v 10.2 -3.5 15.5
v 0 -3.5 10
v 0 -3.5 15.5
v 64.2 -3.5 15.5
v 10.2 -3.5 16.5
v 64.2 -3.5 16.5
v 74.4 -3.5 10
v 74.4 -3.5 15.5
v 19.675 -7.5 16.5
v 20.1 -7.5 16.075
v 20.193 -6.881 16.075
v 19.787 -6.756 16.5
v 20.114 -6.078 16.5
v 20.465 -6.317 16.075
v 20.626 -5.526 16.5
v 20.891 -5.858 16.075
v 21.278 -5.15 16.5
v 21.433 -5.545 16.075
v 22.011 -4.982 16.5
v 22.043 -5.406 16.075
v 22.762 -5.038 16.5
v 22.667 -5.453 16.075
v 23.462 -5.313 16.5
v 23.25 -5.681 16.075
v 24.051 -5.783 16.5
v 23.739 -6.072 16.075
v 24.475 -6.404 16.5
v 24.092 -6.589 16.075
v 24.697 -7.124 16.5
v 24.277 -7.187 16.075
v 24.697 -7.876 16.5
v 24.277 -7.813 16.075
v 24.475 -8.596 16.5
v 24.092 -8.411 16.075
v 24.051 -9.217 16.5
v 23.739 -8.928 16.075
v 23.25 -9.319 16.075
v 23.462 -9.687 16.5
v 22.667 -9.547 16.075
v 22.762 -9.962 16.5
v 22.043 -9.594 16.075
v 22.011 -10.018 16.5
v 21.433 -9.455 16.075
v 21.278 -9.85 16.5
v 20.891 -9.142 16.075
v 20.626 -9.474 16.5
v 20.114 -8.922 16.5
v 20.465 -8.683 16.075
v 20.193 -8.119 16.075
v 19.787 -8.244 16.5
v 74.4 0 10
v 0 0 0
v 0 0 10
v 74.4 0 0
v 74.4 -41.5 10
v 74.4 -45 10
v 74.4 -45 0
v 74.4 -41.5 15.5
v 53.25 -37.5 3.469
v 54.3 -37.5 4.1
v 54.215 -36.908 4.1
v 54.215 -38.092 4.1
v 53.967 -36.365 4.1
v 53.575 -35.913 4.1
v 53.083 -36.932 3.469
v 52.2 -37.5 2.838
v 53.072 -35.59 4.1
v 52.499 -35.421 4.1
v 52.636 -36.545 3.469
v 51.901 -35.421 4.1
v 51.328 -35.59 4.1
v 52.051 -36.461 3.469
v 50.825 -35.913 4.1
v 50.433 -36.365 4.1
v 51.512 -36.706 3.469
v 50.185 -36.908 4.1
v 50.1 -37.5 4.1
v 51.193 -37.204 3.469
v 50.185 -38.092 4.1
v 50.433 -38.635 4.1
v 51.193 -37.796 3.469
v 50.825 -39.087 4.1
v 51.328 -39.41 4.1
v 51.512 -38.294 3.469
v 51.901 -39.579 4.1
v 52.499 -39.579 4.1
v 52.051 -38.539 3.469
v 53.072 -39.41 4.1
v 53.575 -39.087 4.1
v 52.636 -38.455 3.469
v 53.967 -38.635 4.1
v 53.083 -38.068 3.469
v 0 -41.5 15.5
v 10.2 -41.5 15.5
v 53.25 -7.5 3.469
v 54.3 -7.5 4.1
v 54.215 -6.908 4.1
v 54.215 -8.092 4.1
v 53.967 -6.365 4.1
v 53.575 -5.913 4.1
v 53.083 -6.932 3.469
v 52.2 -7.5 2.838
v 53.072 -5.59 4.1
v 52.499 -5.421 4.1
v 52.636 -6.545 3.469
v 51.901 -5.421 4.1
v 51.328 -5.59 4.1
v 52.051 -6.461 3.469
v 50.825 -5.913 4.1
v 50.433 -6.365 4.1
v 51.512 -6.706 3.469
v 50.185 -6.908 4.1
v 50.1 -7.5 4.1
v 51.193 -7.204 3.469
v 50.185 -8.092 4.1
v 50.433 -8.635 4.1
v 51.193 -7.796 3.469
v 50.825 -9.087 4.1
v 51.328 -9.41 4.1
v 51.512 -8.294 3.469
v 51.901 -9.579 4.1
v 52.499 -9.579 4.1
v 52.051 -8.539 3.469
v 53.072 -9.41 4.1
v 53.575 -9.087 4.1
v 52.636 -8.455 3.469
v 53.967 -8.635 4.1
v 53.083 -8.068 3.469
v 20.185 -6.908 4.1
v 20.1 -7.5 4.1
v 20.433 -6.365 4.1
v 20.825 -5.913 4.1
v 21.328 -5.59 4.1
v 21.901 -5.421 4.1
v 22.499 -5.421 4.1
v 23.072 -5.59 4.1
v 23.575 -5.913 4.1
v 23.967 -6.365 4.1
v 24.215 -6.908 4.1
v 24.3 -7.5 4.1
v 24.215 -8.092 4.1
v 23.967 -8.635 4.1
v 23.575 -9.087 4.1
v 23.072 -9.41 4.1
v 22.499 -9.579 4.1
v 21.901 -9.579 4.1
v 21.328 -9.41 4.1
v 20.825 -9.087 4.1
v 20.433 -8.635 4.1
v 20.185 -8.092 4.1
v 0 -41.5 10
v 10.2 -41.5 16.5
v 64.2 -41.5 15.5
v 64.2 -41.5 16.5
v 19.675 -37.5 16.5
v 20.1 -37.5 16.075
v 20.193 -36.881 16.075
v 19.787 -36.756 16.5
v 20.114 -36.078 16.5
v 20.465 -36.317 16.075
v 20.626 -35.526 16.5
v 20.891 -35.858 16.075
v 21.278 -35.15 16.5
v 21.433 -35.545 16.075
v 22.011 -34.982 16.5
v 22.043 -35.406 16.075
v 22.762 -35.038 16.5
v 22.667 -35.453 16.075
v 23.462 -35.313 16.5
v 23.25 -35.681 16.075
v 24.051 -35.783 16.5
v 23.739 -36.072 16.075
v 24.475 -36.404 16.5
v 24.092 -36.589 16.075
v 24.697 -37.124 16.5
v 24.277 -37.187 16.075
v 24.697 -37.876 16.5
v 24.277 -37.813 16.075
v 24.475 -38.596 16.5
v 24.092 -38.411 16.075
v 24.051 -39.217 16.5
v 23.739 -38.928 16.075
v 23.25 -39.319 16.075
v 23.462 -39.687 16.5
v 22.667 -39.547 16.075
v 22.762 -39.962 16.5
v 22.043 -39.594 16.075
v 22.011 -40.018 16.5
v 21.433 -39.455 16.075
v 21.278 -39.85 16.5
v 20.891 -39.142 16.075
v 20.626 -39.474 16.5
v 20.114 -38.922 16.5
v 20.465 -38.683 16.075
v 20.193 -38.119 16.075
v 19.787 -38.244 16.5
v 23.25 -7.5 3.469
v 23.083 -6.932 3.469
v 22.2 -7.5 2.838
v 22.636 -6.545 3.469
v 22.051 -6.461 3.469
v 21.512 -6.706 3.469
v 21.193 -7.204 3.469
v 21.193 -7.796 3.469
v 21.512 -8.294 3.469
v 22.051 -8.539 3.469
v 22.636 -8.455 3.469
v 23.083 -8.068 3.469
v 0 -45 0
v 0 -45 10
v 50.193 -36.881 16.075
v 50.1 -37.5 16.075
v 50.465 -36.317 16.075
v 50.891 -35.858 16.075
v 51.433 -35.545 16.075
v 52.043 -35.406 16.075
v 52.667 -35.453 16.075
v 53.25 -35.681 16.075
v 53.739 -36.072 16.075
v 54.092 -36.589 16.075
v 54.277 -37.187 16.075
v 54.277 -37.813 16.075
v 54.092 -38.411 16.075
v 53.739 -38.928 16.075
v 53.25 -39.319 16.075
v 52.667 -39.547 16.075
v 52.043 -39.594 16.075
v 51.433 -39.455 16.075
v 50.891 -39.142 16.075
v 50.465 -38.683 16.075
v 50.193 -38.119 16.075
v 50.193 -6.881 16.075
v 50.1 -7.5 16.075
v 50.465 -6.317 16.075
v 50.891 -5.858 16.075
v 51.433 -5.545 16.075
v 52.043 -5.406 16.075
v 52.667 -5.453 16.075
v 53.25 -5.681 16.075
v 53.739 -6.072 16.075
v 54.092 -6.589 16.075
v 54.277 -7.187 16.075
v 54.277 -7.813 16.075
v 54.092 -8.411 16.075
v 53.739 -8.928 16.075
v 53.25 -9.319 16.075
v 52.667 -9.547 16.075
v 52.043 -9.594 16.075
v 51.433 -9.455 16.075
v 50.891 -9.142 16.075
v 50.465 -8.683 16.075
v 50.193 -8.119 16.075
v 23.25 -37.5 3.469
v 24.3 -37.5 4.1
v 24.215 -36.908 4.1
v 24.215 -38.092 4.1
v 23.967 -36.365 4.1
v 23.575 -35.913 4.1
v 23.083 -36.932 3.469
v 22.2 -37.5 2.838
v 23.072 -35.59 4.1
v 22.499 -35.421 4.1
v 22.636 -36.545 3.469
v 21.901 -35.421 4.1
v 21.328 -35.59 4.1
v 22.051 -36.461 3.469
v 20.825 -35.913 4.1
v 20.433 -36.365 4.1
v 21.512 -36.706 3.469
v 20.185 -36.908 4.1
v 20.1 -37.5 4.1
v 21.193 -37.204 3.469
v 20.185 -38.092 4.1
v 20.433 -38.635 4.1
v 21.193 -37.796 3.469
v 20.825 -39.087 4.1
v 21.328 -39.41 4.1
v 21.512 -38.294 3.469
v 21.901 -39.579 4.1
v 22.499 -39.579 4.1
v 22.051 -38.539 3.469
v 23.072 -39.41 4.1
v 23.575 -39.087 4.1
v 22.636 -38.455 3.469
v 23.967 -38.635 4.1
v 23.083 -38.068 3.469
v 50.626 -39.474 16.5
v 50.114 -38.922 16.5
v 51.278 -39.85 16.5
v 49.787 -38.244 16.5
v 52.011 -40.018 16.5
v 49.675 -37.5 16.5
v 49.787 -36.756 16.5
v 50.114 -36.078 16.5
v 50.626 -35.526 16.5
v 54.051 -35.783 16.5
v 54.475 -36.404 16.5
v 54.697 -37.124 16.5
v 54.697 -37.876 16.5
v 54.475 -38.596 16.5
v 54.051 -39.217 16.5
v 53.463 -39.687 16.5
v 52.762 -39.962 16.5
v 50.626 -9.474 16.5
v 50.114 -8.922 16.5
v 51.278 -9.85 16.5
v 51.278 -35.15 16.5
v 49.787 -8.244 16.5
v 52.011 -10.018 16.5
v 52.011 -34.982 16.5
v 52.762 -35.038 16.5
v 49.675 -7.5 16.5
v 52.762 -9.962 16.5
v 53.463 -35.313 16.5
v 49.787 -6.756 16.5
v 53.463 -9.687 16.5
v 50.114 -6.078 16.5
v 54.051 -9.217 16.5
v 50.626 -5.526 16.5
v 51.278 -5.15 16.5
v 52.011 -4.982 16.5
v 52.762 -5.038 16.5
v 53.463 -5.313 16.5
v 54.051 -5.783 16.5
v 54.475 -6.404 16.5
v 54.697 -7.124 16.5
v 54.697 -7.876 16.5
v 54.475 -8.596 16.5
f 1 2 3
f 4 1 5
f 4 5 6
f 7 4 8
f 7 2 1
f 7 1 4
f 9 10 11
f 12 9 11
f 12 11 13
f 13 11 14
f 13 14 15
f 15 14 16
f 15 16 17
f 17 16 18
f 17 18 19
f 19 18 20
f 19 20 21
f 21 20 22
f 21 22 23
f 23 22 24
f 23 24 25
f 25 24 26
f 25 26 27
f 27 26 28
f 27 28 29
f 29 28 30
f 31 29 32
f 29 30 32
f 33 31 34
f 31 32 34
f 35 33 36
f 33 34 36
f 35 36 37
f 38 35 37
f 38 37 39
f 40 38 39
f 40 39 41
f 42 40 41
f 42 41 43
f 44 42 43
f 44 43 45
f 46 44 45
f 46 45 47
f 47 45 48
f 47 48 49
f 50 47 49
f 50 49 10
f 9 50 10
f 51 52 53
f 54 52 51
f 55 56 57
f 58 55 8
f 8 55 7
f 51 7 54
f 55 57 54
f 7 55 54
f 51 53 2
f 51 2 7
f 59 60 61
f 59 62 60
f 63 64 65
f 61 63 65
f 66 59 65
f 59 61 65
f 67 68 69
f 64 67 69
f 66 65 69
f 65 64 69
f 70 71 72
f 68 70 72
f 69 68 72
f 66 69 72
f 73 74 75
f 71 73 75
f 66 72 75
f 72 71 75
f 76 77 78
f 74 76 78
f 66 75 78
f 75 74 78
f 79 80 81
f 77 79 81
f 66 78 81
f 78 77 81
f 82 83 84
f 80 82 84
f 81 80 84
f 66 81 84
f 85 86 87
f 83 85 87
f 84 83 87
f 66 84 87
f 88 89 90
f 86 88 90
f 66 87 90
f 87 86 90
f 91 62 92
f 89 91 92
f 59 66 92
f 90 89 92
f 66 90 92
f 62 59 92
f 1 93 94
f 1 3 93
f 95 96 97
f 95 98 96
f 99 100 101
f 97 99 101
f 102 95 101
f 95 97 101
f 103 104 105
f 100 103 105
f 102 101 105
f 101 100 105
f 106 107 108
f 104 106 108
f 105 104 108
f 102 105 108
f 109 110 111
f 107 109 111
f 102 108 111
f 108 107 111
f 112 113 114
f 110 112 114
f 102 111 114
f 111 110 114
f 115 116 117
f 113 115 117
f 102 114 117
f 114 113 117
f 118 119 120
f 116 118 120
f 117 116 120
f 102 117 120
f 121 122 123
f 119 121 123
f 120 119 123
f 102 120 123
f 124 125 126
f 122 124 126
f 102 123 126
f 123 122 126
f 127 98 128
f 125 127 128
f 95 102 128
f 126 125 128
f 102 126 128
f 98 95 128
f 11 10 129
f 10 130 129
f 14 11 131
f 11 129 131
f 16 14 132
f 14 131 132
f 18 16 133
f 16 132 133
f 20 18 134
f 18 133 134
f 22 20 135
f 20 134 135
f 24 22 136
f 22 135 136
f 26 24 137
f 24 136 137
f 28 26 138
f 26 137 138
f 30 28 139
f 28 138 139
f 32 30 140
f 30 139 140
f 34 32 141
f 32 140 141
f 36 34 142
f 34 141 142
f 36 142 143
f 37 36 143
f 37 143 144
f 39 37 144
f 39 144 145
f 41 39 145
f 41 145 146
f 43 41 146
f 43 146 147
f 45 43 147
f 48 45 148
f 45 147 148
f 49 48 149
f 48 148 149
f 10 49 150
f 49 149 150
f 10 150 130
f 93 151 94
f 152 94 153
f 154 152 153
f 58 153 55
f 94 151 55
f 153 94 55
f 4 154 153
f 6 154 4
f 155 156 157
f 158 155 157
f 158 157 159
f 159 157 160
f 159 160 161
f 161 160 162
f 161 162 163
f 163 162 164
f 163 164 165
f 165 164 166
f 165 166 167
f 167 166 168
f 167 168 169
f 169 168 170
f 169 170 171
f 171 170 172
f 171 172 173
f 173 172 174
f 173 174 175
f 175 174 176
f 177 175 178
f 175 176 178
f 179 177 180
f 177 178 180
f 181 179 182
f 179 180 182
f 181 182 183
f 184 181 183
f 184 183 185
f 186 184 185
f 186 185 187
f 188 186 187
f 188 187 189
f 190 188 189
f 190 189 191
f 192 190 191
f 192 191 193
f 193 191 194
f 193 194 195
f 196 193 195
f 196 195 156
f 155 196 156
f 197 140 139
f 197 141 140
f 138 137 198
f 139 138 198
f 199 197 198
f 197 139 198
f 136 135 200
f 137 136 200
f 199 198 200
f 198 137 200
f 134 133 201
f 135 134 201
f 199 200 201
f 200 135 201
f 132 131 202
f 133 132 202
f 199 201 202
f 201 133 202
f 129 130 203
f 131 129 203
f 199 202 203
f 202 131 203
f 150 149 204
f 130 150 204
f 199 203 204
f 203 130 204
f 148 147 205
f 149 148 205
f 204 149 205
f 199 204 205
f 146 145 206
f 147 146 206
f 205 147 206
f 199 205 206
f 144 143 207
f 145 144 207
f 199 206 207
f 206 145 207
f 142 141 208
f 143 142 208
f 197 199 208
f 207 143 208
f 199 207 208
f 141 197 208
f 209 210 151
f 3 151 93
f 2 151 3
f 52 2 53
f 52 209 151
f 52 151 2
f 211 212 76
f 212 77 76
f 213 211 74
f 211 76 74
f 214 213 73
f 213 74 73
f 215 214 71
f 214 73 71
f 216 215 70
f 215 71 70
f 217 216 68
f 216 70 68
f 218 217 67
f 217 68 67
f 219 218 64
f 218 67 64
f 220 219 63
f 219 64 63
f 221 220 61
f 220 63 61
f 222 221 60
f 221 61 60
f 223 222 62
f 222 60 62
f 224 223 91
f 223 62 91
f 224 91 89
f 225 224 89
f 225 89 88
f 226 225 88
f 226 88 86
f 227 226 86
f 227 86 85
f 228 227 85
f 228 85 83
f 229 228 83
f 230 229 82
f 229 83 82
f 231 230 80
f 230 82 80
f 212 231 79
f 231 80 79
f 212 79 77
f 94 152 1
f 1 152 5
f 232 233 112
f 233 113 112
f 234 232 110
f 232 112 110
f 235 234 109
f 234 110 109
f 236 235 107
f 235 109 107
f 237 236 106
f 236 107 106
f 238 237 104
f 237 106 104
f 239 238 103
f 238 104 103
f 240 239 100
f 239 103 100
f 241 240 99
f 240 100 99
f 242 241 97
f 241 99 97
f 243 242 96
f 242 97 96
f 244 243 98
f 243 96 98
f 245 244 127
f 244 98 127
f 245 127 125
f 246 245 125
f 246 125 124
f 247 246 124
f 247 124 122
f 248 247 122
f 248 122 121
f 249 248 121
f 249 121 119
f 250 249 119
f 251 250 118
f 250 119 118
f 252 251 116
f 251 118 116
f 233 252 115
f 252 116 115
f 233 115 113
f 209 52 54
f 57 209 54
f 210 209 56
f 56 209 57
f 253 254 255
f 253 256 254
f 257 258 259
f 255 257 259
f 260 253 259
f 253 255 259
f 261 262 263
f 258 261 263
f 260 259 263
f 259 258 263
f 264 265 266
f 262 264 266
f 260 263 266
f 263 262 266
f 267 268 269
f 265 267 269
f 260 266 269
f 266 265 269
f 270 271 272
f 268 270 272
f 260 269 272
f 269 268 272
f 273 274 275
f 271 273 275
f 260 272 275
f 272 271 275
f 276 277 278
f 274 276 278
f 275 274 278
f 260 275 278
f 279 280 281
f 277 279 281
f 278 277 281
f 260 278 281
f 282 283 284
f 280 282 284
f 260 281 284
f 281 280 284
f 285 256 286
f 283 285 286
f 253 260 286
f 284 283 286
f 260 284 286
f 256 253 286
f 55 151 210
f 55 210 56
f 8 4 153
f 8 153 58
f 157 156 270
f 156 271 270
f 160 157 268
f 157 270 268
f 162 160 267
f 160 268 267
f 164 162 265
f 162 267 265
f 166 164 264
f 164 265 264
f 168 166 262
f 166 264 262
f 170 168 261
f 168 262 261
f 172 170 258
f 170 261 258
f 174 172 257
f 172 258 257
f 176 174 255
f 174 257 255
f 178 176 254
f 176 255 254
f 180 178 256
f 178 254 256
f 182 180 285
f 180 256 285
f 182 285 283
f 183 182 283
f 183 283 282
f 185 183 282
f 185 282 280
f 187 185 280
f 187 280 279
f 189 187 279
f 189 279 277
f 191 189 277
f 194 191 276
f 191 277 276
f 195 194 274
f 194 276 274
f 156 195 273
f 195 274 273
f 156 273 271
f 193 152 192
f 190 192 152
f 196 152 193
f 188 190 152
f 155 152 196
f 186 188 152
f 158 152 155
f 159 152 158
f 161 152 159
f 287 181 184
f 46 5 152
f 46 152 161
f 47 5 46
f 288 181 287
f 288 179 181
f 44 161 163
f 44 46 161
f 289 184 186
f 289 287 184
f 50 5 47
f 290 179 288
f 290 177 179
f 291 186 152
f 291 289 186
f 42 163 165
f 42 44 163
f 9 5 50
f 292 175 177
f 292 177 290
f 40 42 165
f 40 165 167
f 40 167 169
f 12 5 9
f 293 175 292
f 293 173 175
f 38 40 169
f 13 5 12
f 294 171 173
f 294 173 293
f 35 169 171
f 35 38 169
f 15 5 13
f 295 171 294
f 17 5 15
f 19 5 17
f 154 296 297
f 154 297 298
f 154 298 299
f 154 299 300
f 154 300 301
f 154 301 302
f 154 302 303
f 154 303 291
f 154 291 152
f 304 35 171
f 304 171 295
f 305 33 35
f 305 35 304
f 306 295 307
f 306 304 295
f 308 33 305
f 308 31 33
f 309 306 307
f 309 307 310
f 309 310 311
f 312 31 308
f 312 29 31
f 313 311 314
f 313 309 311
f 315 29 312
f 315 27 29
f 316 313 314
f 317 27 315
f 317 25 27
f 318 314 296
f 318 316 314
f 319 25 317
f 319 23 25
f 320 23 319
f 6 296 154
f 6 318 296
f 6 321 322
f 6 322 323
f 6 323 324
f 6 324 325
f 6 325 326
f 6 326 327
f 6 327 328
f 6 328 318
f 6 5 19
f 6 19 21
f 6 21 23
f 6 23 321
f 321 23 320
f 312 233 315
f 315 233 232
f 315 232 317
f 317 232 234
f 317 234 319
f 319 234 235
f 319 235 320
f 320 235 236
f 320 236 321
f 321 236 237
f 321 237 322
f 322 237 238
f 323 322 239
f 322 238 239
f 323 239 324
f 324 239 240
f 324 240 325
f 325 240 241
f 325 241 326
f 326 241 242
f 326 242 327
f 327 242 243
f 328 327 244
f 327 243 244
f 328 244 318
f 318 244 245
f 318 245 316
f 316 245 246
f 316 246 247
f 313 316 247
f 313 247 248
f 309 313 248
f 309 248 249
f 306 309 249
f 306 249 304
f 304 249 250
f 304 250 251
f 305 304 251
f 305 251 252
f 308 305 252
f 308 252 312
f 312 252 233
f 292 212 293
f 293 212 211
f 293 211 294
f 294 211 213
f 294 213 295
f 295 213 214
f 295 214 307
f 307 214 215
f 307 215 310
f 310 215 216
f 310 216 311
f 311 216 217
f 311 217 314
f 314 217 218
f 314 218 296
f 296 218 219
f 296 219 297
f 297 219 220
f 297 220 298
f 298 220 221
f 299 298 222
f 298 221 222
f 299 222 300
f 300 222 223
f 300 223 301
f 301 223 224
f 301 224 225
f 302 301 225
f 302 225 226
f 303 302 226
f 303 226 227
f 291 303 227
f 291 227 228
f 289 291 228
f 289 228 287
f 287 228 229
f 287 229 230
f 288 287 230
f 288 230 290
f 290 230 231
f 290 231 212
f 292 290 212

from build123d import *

# Parameters (mm, degrees)
SKETCH_1_W                   = 74.4
SKETCH_1_H                   = 45
EXTRUDE_1_DEPTH              = 10
SKETCH_2_W                   = 74.4
SKETCH_2_H                   = 38
EXTRUDE_2_DEPTH              = 6.5
HOLE_WIZARD_M5_1_D           = 4.2
HOLE_WIZARD_M5_1_DEPTH       = 12.4
HOLE_WIZARD_M5_1_CSINK_D     = 5.05
HOLE_WIZARD_M5_1_CSINK_ANGLE = 90
HOLE_WIZARD_M5_1_TIP         = 1.2618073
SKETCH_5_OUTSIDE_W           = 94.1
SKETCH_5_OUTSIDE_H           = 64.7
SKETCH_5_OUTSIDE_W_2         = 54
SKETCH_5_OUTSIDE_H_2         = 38
CUT_EXTRUDE_1_DEPTH          = 1


with BuildPart() as part:
    # 草图1 → 凸台-拉伸1 (new body)
    with BuildSketch(Plane.XY):
        with Locations((37.2, -22.5)):
            Rectangle(SKETCH_1_W, SKETCH_1_H)
    extrude(amount=EXTRUDE_1_DEPTH)

    # 草图2 → 凸台-拉伸2 (add)
    with BuildSketch(Plane.XY.offset(10)):
        with Locations((37.2, -22.5)):
            Rectangle(SKETCH_2_W, SKETCH_2_H)
    extrude(amount=EXTRUDE_2_DEPTH)

    # M5 螺纹孔1
    with Locations(Plane.XY.offset(16.5)):
        with Locations((22.2, -7.5), (52.2, -7.5), (52.2, -37.5), (22.2, -37.5)):
            CounterSinkHole(HOLE_WIZARD_M5_1_D / 2, HOLE_WIZARD_M5_1_CSINK_D / 2, depth=HOLE_WIZARD_M5_1_DEPTH, counter_sink_angle=HOLE_WIZARD_M5_1_CSINK_ANGLE)
            with Locations((0, 0, -(HOLE_WIZARD_M5_1_DEPTH + HOLE_WIZARD_M5_1_TIP / 2))):  # 118° drill point
                Cone(0, HOLE_WIZARD_M5_1_D / 2, HOLE_WIZARD_M5_1_TIP, mode=Mode.SUBTRACT)

    # 草图5 outside → 切除-拉伸1 (cut)
    with BuildSketch(Plane.XY.offset(16.5)):
        with Locations((37.2, -22.5)):
            Rectangle(SKETCH_5_OUTSIDE_W, SKETCH_5_OUTSIDE_H)
        with Locations((37.2, -22.5)):
            Rectangle(SKETCH_5_OUTSIDE_W_2, SKETCH_5_OUTSIDE_H_2, mode=Mode.SUBTRACT)
    extrude(amount=-CUT_EXTRUDE_1_DEPTH, mode=Mode.SUBTRACT)


solid = part.part
